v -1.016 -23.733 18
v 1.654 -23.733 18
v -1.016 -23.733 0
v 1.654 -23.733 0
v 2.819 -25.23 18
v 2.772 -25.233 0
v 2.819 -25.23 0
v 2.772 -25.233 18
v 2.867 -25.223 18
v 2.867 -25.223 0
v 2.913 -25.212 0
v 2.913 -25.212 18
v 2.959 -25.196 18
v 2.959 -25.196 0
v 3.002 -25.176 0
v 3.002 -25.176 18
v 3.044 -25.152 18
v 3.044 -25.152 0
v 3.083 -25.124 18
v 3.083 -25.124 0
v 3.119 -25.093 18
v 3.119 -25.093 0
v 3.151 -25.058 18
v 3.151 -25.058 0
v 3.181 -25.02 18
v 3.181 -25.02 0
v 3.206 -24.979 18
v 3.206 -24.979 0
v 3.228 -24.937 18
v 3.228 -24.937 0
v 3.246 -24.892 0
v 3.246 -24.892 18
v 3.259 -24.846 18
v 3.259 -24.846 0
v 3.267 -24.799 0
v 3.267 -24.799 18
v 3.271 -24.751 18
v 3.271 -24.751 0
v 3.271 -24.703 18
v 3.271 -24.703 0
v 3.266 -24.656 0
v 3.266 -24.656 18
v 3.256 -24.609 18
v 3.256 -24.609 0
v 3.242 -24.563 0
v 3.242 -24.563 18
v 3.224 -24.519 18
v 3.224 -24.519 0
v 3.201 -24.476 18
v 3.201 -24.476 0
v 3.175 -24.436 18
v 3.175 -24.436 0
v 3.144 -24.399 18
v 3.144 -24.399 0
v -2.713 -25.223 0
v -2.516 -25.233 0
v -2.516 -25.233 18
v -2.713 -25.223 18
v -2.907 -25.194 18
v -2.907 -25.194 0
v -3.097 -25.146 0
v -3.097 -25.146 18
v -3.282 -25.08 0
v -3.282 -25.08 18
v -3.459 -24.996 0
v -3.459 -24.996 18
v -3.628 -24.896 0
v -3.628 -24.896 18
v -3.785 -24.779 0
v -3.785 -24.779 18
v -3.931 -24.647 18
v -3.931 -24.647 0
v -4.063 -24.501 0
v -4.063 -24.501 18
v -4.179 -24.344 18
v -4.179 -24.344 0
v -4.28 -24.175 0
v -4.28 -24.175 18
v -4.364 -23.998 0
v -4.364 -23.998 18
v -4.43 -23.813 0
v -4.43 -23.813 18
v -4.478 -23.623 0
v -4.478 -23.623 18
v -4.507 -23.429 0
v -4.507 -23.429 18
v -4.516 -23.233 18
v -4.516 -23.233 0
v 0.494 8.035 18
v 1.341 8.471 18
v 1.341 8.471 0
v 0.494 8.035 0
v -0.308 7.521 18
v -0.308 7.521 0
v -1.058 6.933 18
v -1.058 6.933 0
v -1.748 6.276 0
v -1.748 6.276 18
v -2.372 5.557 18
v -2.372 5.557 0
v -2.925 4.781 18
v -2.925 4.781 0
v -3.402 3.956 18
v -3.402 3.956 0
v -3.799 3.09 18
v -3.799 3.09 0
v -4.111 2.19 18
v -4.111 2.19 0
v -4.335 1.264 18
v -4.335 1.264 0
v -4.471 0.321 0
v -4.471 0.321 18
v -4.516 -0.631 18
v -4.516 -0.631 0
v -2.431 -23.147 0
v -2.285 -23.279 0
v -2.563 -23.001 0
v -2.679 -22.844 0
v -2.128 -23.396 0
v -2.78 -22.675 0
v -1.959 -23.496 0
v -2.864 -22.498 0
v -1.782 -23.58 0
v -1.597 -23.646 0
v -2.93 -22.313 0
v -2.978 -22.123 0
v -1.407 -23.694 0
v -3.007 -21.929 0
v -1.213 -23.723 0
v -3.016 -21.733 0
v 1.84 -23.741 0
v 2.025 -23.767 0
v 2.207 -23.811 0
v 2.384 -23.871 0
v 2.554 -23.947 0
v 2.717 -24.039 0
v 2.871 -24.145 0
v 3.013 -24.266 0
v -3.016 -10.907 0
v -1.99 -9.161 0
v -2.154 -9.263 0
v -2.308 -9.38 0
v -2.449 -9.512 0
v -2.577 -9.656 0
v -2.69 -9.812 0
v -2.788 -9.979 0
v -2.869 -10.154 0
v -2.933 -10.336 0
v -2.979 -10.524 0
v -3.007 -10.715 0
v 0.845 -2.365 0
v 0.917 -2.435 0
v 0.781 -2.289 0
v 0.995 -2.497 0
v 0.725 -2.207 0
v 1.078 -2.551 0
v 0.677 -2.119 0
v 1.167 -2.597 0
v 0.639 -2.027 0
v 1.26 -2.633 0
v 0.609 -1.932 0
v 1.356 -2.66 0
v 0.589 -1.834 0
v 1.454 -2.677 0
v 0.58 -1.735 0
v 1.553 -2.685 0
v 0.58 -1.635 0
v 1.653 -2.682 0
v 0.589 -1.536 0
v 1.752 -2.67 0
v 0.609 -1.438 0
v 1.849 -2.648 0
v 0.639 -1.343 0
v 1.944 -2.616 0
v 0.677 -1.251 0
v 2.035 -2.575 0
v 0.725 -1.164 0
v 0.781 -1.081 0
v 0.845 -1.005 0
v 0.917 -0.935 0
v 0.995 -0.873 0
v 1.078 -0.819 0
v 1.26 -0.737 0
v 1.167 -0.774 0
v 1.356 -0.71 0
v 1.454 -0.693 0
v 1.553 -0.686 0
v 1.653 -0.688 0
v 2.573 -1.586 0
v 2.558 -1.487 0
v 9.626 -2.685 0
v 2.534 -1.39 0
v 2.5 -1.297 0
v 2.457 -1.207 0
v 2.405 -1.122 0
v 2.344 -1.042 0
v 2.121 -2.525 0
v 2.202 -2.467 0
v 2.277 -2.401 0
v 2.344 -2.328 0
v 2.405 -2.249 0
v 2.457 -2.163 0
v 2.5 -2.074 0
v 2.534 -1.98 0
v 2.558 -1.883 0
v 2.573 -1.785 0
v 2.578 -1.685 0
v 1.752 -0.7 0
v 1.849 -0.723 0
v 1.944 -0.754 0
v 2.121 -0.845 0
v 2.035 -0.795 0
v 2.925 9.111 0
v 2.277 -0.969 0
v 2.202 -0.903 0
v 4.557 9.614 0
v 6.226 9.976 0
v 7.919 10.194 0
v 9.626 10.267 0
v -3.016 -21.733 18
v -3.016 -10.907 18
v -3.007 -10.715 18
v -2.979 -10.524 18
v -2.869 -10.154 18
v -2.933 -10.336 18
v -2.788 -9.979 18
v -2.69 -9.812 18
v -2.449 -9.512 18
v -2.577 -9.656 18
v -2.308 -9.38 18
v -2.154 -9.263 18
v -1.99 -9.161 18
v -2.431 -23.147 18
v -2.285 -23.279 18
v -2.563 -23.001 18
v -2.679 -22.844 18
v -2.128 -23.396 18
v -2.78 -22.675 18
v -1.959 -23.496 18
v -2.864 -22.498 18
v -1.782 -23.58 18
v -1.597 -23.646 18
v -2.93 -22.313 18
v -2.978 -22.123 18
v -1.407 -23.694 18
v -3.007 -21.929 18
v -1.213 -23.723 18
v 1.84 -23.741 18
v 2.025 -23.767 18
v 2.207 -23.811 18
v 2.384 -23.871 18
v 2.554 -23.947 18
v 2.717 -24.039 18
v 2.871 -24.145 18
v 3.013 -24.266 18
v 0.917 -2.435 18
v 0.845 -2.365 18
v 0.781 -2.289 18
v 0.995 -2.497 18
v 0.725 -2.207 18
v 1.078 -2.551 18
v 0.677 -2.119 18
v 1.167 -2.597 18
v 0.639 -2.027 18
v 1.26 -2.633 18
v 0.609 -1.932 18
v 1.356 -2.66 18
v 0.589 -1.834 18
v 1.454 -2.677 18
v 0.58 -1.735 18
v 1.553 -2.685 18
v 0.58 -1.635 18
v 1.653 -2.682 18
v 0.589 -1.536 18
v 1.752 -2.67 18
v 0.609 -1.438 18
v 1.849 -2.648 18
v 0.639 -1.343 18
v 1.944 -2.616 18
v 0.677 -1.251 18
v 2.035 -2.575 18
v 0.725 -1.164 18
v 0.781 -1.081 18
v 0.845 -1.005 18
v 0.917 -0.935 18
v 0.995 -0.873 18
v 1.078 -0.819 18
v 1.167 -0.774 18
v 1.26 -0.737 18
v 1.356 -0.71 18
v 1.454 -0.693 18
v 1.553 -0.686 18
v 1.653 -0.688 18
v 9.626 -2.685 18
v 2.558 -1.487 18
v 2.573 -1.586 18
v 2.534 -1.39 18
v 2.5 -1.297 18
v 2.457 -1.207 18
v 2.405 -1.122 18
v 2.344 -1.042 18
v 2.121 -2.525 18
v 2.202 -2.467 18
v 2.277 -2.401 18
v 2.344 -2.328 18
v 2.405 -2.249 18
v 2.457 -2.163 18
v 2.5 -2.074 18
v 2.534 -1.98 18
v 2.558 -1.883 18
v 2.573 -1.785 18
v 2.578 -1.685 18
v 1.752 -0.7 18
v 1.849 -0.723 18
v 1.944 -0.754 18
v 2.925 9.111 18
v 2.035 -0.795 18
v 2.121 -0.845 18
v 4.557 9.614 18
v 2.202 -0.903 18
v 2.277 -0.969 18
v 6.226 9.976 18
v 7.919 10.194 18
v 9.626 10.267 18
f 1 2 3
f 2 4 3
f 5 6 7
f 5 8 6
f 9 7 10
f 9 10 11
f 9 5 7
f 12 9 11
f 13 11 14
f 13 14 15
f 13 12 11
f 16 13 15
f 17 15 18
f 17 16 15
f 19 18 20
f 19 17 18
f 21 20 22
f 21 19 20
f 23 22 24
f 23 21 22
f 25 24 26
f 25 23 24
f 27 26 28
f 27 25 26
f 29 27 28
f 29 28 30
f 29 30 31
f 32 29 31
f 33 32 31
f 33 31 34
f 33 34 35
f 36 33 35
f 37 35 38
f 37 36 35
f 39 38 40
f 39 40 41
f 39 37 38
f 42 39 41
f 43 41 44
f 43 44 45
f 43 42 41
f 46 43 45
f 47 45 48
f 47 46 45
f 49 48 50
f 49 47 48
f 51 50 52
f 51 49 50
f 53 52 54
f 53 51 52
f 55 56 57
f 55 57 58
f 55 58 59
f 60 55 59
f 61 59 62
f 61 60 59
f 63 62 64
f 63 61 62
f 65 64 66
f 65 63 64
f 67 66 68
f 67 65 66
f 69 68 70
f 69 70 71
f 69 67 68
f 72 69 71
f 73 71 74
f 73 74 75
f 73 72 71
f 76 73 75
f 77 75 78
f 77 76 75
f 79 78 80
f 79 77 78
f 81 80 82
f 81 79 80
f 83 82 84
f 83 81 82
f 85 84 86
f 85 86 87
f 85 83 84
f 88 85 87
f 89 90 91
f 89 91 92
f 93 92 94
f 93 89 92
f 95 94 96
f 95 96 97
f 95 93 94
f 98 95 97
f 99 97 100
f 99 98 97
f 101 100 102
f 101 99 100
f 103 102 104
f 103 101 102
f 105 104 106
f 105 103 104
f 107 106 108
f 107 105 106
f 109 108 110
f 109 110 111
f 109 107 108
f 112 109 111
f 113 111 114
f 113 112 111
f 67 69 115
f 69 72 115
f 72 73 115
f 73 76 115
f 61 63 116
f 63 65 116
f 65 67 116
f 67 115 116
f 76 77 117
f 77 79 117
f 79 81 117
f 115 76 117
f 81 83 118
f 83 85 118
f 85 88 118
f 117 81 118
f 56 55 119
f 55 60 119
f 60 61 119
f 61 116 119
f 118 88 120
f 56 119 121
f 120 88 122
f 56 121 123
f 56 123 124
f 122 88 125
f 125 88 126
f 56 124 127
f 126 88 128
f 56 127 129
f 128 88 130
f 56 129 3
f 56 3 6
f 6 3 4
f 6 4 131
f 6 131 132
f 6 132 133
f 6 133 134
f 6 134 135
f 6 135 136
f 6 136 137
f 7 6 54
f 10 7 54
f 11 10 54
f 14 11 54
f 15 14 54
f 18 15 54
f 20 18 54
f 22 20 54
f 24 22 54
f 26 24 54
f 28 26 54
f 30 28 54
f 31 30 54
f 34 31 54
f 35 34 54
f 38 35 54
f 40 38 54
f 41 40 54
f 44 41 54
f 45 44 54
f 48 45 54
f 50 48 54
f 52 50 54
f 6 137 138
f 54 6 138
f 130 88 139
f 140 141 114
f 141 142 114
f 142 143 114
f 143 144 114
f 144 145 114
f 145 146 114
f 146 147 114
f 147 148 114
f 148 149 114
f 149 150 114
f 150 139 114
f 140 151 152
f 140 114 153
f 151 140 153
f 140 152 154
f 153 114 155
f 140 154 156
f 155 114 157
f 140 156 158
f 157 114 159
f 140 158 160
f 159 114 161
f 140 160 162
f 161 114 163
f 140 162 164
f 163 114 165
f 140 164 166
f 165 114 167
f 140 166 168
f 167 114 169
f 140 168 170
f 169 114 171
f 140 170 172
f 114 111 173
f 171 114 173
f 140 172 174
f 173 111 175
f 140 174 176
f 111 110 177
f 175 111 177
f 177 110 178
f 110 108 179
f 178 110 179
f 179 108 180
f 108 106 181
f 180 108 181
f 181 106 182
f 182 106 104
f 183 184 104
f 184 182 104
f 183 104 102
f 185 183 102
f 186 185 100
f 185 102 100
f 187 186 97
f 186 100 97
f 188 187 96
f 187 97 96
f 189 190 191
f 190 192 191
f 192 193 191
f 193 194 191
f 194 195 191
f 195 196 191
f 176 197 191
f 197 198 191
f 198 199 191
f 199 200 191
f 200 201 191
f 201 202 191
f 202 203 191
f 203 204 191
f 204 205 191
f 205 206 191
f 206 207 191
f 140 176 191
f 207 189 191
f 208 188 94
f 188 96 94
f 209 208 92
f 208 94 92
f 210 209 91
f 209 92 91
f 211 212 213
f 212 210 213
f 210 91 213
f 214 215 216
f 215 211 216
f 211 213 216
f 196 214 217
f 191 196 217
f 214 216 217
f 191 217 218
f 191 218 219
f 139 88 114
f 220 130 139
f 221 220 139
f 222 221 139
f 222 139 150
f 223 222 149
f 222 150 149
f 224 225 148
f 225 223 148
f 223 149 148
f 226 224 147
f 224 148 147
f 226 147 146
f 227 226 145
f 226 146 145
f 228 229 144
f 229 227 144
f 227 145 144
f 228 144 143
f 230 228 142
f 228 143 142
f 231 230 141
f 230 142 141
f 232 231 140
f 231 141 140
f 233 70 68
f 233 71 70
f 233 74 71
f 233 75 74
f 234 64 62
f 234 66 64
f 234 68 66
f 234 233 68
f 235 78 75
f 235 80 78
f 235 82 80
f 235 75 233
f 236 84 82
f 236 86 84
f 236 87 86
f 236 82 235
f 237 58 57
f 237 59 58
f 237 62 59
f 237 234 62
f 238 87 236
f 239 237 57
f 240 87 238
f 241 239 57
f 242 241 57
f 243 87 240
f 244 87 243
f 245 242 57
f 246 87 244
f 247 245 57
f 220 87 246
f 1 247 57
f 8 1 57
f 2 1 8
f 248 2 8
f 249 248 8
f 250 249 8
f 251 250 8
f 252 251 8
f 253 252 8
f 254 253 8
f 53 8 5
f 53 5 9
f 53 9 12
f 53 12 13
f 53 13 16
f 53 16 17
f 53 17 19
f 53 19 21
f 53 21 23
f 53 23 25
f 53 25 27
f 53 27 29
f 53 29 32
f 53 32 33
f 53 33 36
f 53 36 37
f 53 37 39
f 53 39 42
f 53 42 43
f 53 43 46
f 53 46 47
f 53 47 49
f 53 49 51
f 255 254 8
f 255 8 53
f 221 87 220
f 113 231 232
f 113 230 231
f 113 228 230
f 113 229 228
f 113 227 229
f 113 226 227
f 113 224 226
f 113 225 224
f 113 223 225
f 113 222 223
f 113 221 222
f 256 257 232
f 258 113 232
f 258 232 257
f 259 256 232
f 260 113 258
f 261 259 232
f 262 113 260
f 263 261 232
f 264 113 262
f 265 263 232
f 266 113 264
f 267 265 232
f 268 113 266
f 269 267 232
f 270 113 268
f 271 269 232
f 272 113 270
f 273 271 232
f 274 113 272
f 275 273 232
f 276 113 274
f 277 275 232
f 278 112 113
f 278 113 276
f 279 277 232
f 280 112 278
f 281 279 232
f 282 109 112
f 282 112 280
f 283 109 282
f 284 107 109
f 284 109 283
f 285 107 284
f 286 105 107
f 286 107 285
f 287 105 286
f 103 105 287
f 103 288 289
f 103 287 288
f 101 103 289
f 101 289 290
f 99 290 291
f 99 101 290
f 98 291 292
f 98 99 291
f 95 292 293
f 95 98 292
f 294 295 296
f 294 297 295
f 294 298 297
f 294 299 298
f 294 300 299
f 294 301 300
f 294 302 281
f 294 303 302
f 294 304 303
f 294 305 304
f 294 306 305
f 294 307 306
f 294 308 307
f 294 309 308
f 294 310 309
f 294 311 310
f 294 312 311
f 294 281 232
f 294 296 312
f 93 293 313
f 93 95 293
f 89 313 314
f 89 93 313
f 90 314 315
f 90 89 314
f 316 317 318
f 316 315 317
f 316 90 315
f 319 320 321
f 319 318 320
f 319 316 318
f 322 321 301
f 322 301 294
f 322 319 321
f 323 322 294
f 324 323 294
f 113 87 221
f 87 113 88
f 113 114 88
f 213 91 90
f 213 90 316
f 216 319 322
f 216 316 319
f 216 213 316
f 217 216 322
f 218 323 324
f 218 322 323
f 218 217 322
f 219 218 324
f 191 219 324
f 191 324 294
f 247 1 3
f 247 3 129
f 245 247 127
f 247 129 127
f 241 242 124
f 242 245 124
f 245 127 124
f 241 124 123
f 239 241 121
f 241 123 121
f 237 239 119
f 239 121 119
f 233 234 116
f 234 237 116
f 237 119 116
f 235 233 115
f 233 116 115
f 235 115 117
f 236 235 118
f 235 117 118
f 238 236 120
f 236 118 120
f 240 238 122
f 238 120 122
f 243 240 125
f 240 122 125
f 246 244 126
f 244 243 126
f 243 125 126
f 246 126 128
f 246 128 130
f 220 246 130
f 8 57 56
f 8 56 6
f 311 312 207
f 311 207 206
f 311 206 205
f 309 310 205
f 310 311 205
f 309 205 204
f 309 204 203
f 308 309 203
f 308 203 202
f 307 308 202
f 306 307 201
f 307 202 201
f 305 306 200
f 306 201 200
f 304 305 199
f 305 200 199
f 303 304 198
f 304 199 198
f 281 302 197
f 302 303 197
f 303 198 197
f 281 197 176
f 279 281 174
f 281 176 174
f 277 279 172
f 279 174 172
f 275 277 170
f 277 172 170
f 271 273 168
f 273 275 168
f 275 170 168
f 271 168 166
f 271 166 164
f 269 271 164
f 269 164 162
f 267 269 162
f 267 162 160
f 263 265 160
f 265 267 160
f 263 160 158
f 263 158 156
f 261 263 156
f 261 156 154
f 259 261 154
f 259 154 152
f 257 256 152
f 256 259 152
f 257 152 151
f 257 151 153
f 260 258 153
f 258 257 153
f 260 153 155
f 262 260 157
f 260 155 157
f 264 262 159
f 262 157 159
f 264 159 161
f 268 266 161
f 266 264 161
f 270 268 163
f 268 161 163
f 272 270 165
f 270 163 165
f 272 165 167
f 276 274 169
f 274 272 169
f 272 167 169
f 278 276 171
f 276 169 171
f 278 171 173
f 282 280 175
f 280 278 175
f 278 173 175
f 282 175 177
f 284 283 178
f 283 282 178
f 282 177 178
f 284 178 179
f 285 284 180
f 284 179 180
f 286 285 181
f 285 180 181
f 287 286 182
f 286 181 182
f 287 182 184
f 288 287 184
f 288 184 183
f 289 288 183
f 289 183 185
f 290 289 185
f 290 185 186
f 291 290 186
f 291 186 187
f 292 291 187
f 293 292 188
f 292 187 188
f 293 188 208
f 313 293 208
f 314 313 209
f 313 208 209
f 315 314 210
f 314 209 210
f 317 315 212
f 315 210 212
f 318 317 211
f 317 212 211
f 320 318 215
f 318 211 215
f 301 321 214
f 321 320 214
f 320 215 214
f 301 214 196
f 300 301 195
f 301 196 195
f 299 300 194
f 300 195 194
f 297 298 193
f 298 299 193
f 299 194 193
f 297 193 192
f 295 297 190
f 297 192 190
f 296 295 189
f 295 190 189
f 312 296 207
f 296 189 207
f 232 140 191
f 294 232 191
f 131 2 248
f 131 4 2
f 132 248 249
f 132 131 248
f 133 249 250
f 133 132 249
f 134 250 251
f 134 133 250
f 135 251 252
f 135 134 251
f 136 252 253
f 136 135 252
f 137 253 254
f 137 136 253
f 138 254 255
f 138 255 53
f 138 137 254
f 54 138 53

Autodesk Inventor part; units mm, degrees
ref_plane "YZ Plane" through (0, 0, 0) normal (1, 0, 0) x (0, 1, 0)
ref_plane "XZ Plane" through (0, 0, 0) normal (0, 1, 0) x (-1, 0, 0)
ref_plane "XY Plane" through (0, 0, 0) normal (0, 0, 1) x (1, 0, 0)
sketch "Schizzo1" plane through (0, 0, 0) normal (0, 0, 1) x (1, 0, 0)
  line L0 (9.6257, 10.2674) -> (9.6257, -2.6852)
  arc A0 (9.6257, 10.2674) -> (-4.5165, 4.4095) centre (9.6257, -9.7326) ccw
  line L1 (-0.3743, -9.7326) -> (-4.5165, 4.4095) construction
  line L2 (9.6257, 0.2674) -> (-4.5165, 4.4095) construction
  line L3 (4.6257, -4.7326) -> (9.6257, 0.2674) construction
  line L4 (-4.5165, 4.4095) -> (4.6257, -4.7326) construction
  line L5 (9.6257, 0.2674) -> (-2.4454, -2.6616) construction
  circle A1 centre (1.5783, -1.6852) radius 1
  line L6 (-4.5165, 4.4095) -> (-4.5165, -25.2326)
  line L7 (-4.5165, -25.2326) -> (-3.0165, -25.2326)
  line L8 (-3.0165, -23.7326) -> (-3.0165, -9.7326)
  line L9 (-3.0165, -25.2326) -> (3.5901, -25.2326)
  line L10 (3.5901, -25.2326) -> (3.5901, -23.7326)
  line L11 (3.5901, -23.7326) -> (-3.0165, -23.7326)
  line L12 (-3.0165, -9.7326) -> (9.6257, -2.6852)
  point P0 (0, 0)
  dimension "d6" = 2
  dimension "d24" = 1.5
  dimension "d27" = 14
  dimension "d28" = 1.5
extrude "Estrusione1" add sketch "Schizzo1" along normal blind 18
fillet "Raccordo11" radius 2 4 edges at (-3.0165, -9.7326, 9) (-3.0165, -23.7326, 9) (-4.5165, -25.2326, 9) (3.5901, -23.7326, 9)
fillet "Raccordo12" radius 10 1 edges at (-4.5165, 4.4095, 9)
fillet "Raccordo13" radius 0.5 1 edges at (3.5901, -25.2326, 9)
properties part number "Gancio1" material "Plastica ABS"
